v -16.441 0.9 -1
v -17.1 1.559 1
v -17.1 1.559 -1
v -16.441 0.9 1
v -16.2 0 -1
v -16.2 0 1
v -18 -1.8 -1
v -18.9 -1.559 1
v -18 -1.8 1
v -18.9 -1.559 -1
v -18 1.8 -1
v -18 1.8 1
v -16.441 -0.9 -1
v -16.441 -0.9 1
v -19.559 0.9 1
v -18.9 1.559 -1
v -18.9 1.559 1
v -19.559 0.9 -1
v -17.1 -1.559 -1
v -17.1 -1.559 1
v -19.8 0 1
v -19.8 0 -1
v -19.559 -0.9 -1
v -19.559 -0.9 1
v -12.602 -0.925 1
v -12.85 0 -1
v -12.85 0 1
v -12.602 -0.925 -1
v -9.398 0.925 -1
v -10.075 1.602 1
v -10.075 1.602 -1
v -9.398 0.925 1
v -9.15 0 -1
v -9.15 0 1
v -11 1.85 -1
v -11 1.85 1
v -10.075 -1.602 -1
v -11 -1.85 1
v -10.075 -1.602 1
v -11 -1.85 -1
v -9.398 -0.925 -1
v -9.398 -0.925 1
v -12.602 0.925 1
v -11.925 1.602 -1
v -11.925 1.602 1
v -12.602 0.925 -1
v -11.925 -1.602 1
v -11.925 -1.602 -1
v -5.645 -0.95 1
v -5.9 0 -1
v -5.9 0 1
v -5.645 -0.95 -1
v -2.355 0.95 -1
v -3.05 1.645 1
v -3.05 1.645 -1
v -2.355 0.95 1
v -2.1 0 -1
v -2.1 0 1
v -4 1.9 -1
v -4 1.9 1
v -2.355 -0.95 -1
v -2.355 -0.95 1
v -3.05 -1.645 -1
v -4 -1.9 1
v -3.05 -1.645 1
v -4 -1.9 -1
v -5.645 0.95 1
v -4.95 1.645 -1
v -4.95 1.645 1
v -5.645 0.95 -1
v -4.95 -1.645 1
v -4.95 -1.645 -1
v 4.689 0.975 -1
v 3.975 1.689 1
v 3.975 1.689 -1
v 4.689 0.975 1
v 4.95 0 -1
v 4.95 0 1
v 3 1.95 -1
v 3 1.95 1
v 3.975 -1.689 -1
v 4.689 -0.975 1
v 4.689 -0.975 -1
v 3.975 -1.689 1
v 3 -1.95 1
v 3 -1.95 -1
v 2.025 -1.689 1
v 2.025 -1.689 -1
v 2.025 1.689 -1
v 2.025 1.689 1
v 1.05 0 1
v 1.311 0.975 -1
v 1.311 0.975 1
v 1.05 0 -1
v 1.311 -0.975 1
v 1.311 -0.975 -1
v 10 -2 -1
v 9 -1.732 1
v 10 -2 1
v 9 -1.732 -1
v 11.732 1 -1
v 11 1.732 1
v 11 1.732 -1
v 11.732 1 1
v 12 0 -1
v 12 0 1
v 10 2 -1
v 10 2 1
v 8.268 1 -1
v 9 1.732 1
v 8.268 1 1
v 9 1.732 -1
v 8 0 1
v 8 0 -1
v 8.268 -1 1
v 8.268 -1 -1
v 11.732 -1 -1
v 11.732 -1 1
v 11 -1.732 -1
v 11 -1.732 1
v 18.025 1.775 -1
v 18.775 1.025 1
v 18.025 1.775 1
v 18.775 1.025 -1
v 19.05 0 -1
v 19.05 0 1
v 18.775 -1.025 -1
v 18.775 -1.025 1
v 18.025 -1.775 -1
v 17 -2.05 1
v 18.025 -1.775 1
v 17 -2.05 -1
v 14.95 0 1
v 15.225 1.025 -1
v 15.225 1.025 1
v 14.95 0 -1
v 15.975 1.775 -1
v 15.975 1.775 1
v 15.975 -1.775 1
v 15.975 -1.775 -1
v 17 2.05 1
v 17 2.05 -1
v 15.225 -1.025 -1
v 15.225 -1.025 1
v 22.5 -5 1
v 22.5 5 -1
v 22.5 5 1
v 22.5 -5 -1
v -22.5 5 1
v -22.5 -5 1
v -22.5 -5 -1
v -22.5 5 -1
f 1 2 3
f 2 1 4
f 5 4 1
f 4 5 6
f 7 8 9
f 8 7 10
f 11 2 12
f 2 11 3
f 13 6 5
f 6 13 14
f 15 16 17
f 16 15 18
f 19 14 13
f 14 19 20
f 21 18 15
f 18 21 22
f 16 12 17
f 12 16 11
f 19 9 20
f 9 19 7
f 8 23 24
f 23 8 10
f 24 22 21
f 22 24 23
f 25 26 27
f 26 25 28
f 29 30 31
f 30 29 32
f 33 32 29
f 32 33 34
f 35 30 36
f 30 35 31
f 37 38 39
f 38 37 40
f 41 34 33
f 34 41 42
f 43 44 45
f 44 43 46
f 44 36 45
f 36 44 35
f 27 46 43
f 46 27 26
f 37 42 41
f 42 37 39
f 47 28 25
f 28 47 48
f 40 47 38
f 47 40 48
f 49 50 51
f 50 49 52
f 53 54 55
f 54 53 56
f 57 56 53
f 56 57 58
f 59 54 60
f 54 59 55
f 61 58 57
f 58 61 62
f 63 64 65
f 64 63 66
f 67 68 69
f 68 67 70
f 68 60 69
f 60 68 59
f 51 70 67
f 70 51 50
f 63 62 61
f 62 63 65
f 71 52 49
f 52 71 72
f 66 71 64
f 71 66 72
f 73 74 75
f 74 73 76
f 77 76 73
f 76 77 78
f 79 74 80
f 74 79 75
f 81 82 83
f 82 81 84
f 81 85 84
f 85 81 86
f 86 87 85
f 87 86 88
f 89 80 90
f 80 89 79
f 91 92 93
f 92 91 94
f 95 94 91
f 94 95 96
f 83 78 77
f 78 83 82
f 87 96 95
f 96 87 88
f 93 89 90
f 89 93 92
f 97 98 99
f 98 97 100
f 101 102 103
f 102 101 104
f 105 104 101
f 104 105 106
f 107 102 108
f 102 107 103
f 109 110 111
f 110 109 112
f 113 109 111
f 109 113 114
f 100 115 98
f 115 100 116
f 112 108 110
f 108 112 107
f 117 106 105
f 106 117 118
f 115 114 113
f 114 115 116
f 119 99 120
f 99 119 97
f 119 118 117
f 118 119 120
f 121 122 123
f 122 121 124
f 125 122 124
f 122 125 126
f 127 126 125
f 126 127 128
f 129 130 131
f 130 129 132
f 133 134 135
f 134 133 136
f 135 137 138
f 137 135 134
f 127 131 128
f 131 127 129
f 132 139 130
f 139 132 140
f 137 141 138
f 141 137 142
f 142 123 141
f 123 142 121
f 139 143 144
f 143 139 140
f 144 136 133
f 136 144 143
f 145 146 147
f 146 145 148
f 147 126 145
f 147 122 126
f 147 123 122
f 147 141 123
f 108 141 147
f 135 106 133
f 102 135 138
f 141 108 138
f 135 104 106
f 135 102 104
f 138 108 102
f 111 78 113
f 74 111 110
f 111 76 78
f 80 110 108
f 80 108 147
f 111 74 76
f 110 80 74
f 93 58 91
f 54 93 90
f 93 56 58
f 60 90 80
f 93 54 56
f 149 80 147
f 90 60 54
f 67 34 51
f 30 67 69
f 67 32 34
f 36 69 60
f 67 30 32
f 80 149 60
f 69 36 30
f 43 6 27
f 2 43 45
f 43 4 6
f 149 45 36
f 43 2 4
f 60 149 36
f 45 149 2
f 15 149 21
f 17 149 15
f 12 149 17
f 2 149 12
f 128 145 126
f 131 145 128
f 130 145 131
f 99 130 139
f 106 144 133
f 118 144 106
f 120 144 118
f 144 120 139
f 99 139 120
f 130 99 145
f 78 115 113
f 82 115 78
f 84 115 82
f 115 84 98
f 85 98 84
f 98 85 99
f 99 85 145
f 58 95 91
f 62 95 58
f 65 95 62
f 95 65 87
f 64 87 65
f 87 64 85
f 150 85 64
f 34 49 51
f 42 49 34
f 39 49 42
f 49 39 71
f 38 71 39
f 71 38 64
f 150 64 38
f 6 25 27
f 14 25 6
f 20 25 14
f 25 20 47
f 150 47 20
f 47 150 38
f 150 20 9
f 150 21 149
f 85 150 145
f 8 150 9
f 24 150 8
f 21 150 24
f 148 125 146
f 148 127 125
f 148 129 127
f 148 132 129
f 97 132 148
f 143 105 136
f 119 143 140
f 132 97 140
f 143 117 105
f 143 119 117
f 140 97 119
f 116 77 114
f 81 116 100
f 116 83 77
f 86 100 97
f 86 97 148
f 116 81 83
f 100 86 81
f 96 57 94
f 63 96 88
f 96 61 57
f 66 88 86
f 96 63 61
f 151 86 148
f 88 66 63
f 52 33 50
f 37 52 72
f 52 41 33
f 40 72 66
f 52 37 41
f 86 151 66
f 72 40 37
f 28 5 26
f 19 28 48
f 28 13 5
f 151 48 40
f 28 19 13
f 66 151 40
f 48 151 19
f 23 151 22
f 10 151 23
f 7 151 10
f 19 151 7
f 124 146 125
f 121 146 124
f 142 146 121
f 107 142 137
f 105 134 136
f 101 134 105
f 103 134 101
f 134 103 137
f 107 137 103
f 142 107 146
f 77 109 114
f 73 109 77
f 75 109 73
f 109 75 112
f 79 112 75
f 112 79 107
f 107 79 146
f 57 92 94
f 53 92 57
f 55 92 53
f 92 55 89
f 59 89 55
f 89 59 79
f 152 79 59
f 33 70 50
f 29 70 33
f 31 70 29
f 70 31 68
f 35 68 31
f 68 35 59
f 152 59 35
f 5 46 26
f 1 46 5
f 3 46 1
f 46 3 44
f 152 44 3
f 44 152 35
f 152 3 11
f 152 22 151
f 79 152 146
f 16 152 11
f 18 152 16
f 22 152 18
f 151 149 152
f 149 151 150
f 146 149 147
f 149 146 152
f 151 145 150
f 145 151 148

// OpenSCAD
// make a couple of r=2mm pegs to try w/ varying numbers of sides

module make_peg(r,fn) {
  h=10;
  cylinder(r=r, h=h, $fn=fn);
}

module make_pegs(r) {
  translate([-15,0,0]) make_peg(r,6);
  translate([0,0,0]) make_peg(r,8);
  translate([15,0,0]) make_peg(r,100); // effectively round
  cube([45,10,2],center=true);
}

module make_hole(r,fn) {
  cylinder(r=r,h=5,center=true,$fn=fn);
}


module make_holes(r,fn) {
  difference() {
    cube([45,10,2],center=true);
    for (i=[0,1,2,3,4,5]) {
      translate([-18+i*7,0,0]) {
        make_hole(r+(i/20),fn);
      }
    }
  }
}

// make some pegs, r=2mm, with a couple of different number of sides
//make_pegs(2);

// now make some holes (round) starting at r=2mm and increasing by .05mm
//translate([0,-15,0]) {
//  make_holes(2,100);
//}

// for some button covers the button post is round and about 3.34mm diameter,
// so need to test some not round holes starting at half that radius...
//translate([0,-30,0]) {
  bcr = 1.8; // 3.4mm diameter -> 1.7mm radius, pad it slightly to 1.8mm?
  make_holes(bcr,12);
//}
